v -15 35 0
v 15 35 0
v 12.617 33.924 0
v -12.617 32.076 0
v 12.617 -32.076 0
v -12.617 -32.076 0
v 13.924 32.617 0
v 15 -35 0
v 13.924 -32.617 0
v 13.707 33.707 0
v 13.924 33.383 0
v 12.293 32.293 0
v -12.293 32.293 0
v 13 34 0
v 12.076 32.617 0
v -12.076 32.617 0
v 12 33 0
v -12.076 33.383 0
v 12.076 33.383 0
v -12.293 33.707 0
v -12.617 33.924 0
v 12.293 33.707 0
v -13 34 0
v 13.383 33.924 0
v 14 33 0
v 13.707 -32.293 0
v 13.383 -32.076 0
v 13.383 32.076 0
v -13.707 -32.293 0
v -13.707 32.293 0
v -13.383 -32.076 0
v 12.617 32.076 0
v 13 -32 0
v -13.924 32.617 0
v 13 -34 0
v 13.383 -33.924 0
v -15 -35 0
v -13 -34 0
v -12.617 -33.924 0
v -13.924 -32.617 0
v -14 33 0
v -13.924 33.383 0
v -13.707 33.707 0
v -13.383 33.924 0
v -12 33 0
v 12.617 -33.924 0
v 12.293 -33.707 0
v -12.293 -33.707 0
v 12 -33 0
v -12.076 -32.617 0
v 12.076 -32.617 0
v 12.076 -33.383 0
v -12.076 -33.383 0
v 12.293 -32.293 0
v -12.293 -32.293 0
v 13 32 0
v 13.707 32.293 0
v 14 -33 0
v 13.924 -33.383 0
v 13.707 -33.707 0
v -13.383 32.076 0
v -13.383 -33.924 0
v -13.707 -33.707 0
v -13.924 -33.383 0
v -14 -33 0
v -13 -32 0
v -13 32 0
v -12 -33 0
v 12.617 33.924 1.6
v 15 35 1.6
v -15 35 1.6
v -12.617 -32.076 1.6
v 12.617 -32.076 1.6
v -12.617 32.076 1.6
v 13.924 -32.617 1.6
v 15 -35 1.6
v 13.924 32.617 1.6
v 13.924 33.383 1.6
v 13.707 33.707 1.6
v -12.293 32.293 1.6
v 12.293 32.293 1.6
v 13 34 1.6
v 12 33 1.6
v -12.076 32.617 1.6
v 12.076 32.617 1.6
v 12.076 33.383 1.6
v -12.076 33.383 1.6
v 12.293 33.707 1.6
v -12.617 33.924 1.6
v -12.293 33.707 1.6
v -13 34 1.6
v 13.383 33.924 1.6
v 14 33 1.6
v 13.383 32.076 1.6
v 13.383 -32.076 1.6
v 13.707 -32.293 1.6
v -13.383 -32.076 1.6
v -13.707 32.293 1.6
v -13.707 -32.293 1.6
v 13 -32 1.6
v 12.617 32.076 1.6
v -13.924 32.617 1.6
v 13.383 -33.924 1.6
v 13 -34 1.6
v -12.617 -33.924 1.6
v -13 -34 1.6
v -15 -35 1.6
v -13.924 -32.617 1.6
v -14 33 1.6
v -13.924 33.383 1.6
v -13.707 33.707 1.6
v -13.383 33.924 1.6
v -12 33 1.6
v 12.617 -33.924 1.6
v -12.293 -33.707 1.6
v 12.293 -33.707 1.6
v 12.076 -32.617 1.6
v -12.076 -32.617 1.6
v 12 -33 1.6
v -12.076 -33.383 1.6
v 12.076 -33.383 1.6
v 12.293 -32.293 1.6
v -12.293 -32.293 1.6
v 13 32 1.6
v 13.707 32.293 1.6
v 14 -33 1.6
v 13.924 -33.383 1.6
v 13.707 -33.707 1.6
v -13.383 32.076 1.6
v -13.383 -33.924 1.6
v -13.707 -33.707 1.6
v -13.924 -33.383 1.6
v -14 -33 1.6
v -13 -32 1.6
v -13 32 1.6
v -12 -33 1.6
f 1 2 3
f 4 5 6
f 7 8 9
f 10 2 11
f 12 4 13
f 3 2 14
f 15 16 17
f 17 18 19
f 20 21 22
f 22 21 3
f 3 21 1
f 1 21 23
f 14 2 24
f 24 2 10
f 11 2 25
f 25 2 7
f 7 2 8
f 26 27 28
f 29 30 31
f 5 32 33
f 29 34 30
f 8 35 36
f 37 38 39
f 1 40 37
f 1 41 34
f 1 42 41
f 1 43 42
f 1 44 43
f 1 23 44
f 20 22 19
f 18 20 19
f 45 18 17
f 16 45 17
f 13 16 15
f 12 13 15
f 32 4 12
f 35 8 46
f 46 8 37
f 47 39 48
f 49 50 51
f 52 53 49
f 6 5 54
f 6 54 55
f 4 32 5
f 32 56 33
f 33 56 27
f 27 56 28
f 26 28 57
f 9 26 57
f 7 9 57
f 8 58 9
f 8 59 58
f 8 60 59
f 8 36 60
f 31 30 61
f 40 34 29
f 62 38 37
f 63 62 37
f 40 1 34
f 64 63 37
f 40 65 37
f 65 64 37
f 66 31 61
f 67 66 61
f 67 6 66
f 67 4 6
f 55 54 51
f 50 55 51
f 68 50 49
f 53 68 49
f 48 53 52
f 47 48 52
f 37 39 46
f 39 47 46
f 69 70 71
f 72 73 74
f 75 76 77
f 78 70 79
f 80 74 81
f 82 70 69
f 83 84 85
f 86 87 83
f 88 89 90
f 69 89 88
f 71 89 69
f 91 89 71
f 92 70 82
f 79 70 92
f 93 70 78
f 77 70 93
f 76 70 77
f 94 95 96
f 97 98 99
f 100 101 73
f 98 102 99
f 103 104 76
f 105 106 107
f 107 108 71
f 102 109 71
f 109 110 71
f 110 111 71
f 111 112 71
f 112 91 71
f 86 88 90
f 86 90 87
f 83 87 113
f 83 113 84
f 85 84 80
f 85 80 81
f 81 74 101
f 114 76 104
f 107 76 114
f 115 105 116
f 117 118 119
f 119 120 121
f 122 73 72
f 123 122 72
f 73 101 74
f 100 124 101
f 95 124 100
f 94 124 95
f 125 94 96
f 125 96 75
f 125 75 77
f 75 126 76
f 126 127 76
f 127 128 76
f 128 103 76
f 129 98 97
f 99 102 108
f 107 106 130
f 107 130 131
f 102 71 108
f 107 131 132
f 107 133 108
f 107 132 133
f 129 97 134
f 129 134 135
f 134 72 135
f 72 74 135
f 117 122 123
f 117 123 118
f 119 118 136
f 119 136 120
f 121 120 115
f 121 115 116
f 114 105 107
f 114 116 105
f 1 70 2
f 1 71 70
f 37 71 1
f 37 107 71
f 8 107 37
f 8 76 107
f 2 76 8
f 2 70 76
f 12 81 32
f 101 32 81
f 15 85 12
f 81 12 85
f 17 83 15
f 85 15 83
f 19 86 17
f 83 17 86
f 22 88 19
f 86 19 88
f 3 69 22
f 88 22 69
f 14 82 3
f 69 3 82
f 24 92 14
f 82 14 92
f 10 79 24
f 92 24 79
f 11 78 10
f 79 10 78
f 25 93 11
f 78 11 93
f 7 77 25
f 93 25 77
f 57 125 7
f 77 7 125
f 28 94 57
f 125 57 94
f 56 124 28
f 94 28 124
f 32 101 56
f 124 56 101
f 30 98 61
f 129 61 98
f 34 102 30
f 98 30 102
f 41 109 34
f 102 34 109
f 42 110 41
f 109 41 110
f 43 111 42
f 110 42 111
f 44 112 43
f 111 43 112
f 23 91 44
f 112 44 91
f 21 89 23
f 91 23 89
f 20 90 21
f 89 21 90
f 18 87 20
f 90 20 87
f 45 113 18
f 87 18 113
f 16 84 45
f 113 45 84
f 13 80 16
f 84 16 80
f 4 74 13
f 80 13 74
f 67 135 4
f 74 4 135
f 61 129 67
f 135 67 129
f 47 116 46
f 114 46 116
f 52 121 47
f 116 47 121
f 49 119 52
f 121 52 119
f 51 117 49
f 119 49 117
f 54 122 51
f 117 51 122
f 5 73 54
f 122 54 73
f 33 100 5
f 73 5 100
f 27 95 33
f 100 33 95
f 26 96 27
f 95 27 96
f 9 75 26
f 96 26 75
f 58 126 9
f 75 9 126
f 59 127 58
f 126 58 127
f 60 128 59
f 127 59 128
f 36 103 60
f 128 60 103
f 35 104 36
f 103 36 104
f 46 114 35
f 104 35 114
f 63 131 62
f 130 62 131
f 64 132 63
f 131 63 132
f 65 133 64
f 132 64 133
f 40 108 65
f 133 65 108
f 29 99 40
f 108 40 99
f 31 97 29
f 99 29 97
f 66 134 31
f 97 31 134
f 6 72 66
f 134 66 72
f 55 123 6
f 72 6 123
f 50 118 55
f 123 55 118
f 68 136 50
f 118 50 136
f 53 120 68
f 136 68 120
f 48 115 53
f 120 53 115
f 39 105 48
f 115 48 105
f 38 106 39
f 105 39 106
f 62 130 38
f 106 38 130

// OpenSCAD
/*
 * PCB Project Case
 * By smkent (GitHub) / bulbasaur0 (Printables)
 *
 * Licensed under Creative Commons (4.0 International License) Attribution-ShareAlike
 */

/* [Rendering Options] */
Print_Orientation = true;

/* [Model Options] */
PCB_Type = "3x7"; // [3x7: 3x7 cm]

/* [Size] */
// All units in millimeters

/* [Advanced Options] */

/* [Development Toggles] */

module __end_customizer_options__() { }

// Constants //

$fa = $preview ? $fa : 2;
$fs = $preview ? $fs : 0.4;

pcb_table = [
    ["3x7", [[30, 70], 2, 2]],
];

pcb_spec = vsearch(pcb_table, PCB_Type);
assert(pcb_spec, str("Unknown pcb type '", PCB_Type, "'"));

pcb_size = pcb_spec[0];
pcb_screw_d = pcb_spec[1];
pcb_screw_inset = pcb_spec[2];

// Functions //

function vec_add(vector, add) = [for (v = vector) v + add];

function vsearch(vec, term) = (
    let (r = [for (i = vec) if (i[0] == term) i])
    len(r) == 1 ? r[0][1] : undef
);

// Modules //

module at_pcb_screws() {
    for (mx = [0, 1])
    for (my = [0, 1])
    mirror([mx, 0])
    mirror([0, my])
    translate(vec_add(pcb_size / 2, -pcb_screw_inset))
    children();
}

module pcb() {
    linear_extrude(height=1.6)
    difference() {
        square(pcb_size, center=true);
        at_pcb_screws()
        circle(d=pcb_screw_d);
    }
}

module main() {
    color("darkseagreen", 0.9)
    pcb();
}

main();
